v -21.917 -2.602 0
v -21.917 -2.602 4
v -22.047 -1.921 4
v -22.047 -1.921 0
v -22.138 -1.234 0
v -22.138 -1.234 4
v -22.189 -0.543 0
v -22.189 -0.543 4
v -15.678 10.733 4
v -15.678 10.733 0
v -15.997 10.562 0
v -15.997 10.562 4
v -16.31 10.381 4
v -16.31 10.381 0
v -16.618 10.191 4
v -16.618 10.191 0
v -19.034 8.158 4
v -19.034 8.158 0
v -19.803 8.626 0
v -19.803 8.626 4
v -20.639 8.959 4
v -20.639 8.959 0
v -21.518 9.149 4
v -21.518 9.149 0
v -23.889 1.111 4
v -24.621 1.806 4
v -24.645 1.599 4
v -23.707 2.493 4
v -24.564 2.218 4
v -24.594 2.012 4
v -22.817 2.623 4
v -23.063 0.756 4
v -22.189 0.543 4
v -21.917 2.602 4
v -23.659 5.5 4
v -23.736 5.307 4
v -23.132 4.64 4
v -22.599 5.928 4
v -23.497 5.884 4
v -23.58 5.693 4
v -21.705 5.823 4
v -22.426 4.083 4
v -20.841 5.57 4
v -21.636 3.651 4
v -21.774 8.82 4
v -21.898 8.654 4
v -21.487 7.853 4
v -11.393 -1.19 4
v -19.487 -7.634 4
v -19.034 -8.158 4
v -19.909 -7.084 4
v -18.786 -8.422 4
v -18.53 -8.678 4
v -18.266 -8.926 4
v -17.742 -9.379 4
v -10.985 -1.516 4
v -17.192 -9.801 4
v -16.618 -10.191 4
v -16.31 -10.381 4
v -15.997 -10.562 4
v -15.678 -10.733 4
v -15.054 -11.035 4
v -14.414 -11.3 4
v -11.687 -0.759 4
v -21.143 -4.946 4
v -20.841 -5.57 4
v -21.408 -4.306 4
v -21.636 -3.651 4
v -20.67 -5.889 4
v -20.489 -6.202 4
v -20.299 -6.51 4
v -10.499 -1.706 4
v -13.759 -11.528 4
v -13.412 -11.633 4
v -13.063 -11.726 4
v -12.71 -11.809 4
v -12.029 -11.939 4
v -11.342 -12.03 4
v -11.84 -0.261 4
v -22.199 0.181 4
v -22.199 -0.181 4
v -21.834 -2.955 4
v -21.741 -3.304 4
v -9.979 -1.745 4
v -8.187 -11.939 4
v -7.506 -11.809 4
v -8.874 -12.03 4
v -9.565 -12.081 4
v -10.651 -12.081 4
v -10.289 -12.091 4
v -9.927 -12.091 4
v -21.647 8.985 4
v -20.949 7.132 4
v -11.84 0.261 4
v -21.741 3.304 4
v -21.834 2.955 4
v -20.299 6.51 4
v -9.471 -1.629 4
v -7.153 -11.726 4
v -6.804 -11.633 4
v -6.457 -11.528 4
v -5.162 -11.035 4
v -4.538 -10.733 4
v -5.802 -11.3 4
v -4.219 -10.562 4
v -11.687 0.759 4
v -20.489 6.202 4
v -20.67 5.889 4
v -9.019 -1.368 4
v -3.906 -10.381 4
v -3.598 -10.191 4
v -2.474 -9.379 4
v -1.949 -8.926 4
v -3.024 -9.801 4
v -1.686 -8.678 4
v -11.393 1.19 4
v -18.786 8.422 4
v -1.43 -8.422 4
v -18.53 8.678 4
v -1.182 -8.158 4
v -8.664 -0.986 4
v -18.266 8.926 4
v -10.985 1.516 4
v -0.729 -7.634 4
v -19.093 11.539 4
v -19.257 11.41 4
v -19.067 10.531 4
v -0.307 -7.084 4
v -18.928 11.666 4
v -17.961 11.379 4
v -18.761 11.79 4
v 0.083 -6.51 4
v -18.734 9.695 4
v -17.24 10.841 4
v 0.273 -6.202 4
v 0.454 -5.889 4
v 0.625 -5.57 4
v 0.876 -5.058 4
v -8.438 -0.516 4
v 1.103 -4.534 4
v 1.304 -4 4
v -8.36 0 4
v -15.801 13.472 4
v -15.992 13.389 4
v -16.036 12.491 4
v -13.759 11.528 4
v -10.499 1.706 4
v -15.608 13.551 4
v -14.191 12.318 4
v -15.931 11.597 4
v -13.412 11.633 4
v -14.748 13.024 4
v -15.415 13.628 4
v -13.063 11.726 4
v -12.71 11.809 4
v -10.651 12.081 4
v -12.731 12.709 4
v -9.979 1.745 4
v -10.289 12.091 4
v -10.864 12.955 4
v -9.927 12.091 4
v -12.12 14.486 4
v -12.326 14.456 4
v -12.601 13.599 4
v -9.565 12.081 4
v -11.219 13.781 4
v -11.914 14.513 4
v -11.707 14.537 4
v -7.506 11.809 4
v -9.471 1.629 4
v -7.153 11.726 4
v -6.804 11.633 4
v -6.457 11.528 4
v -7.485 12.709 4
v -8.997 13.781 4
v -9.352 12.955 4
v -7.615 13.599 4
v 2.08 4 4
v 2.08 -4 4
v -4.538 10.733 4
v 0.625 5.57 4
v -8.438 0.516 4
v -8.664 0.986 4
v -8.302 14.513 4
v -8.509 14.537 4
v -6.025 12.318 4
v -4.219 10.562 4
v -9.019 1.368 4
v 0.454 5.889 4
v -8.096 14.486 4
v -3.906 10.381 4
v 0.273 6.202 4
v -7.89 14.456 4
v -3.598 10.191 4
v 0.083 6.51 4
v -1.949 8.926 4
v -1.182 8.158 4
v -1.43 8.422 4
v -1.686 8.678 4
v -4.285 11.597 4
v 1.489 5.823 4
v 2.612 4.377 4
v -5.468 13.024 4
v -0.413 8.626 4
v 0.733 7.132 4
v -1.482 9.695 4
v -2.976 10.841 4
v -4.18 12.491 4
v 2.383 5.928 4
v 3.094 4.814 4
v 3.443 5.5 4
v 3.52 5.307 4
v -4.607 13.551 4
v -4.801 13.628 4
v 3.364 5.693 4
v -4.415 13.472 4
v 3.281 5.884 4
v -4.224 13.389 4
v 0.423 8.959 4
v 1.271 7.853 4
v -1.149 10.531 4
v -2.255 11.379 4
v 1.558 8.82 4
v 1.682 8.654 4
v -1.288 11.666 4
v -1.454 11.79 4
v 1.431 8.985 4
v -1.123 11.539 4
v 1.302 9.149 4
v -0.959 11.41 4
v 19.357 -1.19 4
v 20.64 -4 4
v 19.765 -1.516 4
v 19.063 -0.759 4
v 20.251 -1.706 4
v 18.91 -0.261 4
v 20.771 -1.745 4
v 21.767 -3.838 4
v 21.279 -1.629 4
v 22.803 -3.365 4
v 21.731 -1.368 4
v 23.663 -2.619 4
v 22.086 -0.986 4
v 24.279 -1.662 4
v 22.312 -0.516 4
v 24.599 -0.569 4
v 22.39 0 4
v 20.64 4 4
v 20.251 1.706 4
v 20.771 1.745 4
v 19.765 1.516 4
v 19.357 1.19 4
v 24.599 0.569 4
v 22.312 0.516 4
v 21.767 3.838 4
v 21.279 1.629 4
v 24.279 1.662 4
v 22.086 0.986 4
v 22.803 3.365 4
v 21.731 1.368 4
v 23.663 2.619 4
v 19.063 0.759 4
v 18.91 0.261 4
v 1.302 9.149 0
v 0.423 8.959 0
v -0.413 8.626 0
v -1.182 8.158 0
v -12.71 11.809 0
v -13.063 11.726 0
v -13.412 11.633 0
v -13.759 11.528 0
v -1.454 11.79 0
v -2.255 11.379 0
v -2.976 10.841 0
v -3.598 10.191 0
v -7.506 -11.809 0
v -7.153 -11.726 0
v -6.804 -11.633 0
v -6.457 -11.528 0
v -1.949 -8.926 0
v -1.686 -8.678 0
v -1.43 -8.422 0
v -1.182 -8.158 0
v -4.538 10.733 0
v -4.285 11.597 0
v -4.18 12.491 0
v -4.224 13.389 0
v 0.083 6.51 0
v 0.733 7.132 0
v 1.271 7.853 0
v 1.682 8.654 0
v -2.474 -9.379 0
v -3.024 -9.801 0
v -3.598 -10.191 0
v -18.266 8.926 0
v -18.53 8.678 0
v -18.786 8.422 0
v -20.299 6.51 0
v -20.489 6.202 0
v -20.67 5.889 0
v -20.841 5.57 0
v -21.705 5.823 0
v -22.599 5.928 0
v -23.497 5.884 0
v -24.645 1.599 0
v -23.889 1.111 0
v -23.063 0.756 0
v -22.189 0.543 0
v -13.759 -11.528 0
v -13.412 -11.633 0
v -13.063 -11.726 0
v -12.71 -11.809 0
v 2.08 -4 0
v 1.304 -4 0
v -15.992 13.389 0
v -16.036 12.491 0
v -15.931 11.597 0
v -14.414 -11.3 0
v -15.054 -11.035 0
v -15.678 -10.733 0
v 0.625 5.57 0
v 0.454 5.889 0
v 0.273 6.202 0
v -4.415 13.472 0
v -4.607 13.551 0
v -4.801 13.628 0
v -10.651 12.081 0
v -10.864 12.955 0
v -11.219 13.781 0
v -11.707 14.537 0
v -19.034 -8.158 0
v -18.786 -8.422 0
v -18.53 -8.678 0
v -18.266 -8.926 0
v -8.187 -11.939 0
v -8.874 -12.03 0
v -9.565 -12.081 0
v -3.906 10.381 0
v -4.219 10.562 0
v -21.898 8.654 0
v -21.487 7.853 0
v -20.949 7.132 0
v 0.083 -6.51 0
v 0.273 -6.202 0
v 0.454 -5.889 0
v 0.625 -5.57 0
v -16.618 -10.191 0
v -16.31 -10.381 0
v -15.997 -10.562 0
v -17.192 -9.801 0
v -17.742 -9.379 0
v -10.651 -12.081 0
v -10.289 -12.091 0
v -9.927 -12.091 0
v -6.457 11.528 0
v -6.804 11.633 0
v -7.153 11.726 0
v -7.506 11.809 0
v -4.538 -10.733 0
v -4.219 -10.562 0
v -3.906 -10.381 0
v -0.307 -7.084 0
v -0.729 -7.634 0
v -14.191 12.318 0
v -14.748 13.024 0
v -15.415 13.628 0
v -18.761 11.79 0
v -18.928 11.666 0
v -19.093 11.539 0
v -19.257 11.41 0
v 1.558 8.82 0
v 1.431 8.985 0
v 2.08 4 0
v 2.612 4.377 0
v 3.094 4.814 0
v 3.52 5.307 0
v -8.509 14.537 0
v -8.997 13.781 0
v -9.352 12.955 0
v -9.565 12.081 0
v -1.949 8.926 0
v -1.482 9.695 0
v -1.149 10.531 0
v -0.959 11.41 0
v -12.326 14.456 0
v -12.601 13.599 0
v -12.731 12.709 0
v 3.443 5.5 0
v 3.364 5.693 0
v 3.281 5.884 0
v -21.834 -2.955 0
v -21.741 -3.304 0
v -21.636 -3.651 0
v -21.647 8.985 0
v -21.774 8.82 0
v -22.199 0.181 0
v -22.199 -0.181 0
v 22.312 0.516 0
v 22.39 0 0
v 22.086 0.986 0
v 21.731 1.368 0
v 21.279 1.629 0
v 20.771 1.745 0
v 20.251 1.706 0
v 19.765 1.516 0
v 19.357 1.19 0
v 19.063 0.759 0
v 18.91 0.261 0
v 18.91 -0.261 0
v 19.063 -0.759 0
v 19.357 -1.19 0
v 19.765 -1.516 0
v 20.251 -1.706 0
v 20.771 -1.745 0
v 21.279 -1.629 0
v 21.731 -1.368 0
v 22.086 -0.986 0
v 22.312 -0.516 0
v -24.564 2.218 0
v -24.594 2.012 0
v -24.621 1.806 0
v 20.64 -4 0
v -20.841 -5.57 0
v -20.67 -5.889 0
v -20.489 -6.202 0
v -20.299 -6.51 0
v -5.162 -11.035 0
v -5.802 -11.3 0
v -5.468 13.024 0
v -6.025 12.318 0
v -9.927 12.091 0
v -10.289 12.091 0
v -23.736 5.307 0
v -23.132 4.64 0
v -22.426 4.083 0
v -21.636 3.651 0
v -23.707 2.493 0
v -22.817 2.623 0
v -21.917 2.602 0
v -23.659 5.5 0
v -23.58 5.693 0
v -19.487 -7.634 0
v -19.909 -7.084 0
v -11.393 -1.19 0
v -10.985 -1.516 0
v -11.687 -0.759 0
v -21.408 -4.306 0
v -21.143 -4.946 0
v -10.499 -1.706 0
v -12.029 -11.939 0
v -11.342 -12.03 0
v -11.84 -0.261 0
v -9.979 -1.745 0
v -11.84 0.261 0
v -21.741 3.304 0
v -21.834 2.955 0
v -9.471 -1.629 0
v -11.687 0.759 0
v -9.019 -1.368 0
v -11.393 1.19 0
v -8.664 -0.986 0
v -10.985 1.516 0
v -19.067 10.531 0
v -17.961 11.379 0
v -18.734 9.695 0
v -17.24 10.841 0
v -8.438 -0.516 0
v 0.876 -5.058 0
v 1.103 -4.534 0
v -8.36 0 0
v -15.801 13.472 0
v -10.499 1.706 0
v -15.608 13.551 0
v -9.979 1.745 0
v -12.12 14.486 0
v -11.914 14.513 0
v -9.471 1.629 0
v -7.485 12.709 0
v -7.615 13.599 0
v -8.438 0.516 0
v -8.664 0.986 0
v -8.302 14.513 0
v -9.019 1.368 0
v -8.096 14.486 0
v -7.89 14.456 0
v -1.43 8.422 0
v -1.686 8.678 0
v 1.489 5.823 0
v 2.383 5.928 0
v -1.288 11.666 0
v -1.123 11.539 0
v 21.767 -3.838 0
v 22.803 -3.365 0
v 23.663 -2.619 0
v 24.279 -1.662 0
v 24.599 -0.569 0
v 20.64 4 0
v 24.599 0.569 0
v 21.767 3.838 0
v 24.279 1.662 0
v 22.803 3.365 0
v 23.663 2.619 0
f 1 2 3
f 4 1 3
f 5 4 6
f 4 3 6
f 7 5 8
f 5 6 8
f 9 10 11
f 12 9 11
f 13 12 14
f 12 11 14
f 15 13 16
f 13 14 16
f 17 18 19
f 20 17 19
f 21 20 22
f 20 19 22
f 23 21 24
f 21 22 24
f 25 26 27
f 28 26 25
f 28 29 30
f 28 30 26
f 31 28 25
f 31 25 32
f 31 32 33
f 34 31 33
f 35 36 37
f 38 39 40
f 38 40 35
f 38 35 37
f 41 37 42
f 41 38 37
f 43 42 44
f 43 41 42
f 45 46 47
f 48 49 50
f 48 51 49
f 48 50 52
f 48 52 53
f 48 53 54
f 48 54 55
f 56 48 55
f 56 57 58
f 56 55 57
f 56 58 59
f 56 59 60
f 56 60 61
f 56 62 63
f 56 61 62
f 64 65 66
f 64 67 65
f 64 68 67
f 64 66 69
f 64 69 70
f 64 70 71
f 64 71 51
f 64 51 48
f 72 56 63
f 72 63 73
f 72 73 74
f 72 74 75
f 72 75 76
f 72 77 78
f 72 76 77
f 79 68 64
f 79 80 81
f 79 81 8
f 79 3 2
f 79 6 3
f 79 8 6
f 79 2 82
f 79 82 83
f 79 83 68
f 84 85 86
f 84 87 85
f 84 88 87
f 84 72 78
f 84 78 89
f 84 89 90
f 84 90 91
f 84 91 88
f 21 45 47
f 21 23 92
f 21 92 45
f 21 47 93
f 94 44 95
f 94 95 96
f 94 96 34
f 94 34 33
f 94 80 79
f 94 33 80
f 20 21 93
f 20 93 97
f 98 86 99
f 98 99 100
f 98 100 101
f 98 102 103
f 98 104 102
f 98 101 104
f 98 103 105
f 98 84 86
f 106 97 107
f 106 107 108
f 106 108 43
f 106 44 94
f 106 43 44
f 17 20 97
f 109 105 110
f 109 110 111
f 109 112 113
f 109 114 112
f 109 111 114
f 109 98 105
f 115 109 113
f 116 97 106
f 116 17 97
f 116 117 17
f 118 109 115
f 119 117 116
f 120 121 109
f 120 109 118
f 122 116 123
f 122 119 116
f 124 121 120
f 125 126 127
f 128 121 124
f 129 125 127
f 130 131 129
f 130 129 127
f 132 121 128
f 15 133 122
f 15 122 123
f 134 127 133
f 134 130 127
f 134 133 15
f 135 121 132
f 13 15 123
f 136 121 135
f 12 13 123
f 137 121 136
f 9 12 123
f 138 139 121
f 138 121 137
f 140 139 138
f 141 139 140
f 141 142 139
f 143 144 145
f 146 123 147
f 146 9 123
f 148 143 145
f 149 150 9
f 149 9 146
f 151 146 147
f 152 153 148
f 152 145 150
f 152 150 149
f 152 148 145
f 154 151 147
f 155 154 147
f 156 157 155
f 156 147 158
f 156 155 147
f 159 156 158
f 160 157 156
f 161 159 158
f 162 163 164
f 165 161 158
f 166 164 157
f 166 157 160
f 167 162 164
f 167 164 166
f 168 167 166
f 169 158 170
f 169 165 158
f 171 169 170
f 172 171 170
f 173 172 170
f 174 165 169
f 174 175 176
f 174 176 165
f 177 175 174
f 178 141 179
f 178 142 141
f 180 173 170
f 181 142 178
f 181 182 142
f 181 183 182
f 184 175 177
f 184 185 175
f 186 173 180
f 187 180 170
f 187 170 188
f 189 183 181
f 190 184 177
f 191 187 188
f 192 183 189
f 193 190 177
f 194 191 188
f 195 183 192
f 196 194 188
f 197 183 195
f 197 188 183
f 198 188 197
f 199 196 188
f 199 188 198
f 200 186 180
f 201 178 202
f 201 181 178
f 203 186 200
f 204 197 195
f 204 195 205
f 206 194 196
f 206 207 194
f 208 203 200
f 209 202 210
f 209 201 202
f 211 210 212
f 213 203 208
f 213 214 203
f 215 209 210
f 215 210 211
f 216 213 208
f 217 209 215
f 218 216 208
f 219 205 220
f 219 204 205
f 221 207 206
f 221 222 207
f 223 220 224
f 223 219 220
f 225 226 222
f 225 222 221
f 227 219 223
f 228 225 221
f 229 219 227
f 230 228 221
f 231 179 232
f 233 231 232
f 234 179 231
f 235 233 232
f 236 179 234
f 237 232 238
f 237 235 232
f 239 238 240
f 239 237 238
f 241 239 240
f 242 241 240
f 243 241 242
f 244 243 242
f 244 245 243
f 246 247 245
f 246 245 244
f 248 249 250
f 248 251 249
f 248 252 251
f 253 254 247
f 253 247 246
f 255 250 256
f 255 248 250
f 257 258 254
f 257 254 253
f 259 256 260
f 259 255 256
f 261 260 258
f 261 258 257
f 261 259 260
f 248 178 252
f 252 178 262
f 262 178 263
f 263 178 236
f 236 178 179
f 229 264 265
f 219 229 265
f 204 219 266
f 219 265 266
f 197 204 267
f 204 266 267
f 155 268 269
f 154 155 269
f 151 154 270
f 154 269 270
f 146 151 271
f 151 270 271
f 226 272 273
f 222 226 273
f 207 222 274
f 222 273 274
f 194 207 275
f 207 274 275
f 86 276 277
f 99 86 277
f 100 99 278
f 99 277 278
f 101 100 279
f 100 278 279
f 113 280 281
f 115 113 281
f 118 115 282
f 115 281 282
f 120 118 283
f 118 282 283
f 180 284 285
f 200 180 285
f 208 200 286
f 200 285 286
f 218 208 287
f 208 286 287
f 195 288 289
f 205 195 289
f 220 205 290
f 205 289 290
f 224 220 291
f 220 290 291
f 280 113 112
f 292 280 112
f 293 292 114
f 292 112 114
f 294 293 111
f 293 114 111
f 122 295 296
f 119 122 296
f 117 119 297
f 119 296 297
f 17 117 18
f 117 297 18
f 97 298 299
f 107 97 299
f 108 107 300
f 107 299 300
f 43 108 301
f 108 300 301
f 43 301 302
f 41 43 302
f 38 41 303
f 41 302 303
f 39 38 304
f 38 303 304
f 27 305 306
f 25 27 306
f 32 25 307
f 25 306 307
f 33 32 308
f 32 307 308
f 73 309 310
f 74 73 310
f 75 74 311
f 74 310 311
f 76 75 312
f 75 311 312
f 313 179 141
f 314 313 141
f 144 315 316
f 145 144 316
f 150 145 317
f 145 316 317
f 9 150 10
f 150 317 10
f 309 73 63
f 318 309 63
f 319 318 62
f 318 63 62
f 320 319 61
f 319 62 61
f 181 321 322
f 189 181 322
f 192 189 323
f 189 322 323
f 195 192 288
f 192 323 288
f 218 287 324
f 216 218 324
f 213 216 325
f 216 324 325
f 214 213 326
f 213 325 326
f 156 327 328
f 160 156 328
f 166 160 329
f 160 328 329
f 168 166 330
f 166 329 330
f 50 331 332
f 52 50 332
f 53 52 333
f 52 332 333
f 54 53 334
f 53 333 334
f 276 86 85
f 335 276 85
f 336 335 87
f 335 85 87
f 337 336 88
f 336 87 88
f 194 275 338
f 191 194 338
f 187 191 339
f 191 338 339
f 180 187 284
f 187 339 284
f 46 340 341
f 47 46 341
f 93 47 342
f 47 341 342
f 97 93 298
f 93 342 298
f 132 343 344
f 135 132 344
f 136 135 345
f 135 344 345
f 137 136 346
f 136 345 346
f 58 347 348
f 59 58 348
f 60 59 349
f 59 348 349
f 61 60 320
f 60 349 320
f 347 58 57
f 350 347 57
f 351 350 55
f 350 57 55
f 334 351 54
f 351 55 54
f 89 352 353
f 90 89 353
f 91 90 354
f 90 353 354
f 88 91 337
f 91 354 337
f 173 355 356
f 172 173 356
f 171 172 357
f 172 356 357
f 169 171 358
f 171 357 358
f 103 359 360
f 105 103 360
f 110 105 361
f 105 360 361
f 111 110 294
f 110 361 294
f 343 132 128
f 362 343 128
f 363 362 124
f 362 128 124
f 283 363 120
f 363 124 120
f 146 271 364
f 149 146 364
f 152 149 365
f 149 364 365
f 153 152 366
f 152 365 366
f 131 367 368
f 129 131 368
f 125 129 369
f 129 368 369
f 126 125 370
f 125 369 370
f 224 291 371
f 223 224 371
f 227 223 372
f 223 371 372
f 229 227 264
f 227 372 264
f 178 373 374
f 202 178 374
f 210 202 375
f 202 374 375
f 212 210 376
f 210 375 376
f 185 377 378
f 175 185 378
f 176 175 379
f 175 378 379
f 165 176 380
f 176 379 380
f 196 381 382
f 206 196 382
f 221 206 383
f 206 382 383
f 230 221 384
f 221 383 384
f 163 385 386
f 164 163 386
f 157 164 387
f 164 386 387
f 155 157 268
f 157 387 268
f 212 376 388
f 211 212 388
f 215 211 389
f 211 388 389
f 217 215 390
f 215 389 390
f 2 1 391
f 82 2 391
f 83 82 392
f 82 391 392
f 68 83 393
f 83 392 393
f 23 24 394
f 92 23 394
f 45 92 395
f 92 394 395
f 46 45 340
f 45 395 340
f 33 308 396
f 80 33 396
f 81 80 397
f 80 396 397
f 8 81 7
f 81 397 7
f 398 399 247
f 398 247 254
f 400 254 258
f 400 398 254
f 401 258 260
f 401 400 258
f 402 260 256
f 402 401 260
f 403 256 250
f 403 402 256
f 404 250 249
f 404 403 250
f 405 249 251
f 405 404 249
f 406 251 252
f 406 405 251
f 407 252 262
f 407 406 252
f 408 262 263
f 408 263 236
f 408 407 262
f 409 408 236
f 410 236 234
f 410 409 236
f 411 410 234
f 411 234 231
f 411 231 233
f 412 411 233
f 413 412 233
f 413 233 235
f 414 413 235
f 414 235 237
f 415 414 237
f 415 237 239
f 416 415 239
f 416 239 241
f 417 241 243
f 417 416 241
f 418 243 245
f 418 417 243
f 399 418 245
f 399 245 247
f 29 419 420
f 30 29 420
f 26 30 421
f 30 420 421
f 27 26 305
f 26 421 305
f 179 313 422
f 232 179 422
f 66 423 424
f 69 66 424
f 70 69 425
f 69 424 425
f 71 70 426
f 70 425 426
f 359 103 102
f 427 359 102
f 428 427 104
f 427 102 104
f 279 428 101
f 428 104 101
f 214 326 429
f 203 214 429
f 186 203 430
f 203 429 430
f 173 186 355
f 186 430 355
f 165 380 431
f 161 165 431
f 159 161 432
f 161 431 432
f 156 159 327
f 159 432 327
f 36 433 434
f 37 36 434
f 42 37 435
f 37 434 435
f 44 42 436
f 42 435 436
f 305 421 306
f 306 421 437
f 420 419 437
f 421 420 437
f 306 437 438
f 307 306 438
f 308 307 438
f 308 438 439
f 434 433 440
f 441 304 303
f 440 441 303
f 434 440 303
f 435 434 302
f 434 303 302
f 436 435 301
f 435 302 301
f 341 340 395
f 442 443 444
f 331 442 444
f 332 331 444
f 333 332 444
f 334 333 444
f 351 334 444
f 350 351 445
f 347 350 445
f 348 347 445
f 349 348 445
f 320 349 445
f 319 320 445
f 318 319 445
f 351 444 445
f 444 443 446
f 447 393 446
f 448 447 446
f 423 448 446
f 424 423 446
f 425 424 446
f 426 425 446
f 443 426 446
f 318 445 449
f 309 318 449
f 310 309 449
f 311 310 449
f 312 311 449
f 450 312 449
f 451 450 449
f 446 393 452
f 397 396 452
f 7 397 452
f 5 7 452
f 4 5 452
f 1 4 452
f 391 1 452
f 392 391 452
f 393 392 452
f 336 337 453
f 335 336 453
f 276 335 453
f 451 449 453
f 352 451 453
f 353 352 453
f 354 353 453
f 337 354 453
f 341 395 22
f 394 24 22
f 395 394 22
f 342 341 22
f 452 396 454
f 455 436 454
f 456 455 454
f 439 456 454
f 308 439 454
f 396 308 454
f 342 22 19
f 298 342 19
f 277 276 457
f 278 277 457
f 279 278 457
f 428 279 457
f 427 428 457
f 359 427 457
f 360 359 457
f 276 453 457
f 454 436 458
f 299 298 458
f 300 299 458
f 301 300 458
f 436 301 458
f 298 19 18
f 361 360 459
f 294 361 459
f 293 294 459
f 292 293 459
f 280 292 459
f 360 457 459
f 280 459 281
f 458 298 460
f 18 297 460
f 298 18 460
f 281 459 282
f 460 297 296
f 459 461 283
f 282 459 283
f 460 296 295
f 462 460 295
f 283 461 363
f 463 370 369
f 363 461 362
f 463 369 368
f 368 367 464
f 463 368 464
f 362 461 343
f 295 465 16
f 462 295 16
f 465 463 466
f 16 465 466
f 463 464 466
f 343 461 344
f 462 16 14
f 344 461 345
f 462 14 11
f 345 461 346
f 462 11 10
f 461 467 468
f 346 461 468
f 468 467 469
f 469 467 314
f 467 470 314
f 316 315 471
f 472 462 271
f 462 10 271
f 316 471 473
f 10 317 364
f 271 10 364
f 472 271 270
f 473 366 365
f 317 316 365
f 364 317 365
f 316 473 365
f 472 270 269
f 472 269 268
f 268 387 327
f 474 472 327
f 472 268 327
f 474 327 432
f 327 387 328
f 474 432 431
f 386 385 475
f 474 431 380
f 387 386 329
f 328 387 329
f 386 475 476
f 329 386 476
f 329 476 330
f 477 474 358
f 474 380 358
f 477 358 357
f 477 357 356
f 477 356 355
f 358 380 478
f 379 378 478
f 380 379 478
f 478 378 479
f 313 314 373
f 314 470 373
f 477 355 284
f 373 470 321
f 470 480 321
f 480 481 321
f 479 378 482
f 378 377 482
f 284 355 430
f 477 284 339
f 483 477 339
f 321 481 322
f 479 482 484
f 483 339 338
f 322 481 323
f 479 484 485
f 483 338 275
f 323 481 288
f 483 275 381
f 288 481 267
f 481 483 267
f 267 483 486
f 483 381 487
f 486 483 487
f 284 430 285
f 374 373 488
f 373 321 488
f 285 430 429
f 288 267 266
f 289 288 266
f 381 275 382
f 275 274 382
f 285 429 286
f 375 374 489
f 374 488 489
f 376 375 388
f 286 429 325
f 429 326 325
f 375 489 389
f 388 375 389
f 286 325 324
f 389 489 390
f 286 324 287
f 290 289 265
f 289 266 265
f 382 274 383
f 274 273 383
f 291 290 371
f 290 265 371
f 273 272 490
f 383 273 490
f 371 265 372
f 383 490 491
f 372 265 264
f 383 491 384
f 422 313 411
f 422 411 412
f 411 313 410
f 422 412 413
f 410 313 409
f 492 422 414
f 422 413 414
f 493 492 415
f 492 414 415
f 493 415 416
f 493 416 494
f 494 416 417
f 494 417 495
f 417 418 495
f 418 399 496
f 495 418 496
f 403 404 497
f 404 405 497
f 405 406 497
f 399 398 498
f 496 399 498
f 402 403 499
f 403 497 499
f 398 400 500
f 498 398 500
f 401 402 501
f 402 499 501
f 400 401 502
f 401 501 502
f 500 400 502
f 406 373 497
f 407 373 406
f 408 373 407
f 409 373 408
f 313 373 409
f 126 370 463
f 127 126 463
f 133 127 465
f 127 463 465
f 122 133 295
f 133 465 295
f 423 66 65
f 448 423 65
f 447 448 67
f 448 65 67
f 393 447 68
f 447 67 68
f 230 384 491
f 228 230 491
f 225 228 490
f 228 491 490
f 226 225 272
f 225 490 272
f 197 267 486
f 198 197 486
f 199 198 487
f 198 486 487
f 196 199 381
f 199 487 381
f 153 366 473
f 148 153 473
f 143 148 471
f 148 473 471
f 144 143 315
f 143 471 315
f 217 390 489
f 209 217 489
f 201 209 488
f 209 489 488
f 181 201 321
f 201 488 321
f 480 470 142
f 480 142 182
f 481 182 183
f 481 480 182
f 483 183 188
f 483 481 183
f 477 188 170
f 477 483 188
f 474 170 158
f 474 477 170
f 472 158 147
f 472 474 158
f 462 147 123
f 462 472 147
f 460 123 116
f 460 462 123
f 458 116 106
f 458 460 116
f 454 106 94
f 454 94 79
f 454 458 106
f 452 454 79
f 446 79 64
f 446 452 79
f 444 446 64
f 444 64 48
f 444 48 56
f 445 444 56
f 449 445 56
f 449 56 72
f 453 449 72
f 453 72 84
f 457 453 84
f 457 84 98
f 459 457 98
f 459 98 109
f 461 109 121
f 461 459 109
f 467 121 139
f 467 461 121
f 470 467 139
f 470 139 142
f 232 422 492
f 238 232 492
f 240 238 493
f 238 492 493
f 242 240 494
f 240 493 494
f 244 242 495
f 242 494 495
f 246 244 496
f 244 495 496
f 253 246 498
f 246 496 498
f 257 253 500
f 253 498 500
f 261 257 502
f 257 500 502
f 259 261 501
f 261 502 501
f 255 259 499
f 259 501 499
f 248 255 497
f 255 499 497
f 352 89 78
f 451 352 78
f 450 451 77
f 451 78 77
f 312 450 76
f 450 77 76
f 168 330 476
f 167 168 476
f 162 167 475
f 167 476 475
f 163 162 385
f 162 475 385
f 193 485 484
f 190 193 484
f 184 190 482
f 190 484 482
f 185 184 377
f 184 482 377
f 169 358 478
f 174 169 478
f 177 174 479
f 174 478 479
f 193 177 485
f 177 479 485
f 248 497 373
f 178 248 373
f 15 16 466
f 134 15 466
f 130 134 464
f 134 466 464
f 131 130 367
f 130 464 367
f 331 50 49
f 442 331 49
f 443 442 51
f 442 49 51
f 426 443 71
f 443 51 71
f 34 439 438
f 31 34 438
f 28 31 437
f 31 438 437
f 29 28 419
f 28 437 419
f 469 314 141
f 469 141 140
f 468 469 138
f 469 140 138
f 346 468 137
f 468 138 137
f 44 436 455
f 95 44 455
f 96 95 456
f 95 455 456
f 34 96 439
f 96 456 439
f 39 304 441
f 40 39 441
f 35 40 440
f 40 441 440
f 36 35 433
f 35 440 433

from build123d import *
from build123d.topology import SkipClean

# Parameters (mm, degrees)
SKETCH1_R           = 1.75
BOSS_EXTRUDE1_DEPTH = 4
CUT_EXTRUDE1_DEPTH  = 29.891595766


with BuildPart() as part:
    # Sketch1 → Boss-Extrude1 (new body)
    with BuildSketch(Plane.XY):
        with BuildLine():
            Line((20.64, 4), (2.08, 4))
            ThreePointArc((2.08, 4), (2.859386397, 4.588201733), (3.5201075, 5.30713988))
            ThreePointArc((3.5201075, 5.30713988), (3.403753673, 5.596745198), (3.281246369, 5.883801663))
            ThreePointArc((3.281246369, 5.883801663), (1.933634043, 5.894040025), (0.625453025, 5.57027124))
            ThreePointArc((0.625453025, 5.57027124), (0.364644212, 6.046375), (0.082730667, 6.510293938))
            ThreePointArc((0.082730667, 6.510293938), (1.017213169, 7.48132754), (1.68215265, 8.65351323))
            ThreePointArc((1.68215265, 8.65351323), (1.494808112, 8.903135899), (1.302179463, 9.148703928))
            ThreePointArc((1.302179463, 9.148703928), (-0.002163969, 8.809805691), (-1.181972273, 8.158486898))
            ThreePointArc((-1.181972273, 8.158486898), (-1.557118962, 8.550865528), (-1.949497592, 8.926012217))
            ThreePointArc((-1.949497592, 8.926012217), (-1.298178799, 10.105820521), (-0.959280562, 11.410163953))
            ThreePointArc((-0.959280562, 11.410163953), (-1.204848591, 11.602792602), (-1.45447126, 11.79013714))
            ThreePointArc((-1.45447126, 11.79013714), (-2.62665695, 11.125197659), (-3.597690552, 10.190715157))
            ThreePointArc((-3.597690552, 10.190715157), (-4.06160949, 10.472628702), (-4.53771325, 10.733437515))
            ThreePointArc((-4.53771325, 10.733437515), (-4.213944465, 12.041618533), (-4.224182827, 13.389230859))
            ThreePointArc((-4.224182827, 13.389230859), (-4.511239292, 13.511738163), (-4.80084461, 13.62809199))
            ThreePointArc((-4.80084461, 13.62809199), (-5.760990039, 12.682425791), (-6.457074605, 11.528463019))
            ThreePointArc((-6.457074605, 11.528463019), (-6.978150482, 11.680699536), (-7.505533688, 11.809396783))
            ThreePointArc((-7.505533688, 11.809396783), (-7.531379219, 13.156800143), (-7.890056453, 14.455843809))
            ThreePointArc((-7.890056453, 14.455843809), (-8.199038929, 14.499881098), (-8.508890771, 14.537314892))
            ThreePointArc((-8.508890771, 14.537314892), (-9.191563616, 13.375367565), (-9.565262132, 12.080565177))
            ThreePointArc((-9.565262132, 12.080565177), (-10.10798449, 12.09275), (-10.650706848, 12.080565177))
            ThreePointArc((-10.650706848, 12.080565177), (-11.024405364, 13.375367565), (-11.707078209, 14.537314892))
            ThreePointArc((-11.707078209, 14.537314892), (-12.016930051, 14.499881098), (-12.325912527, 14.455843809))
            ThreePointArc((-12.325912527, 14.455843809), (-12.684589761, 13.156800143), (-12.710435292, 11.809396783))
            ThreePointArc((-12.710435292, 11.809396783), (-13.237818498, 11.680699536), (-13.758894375, 11.528463019))
            ThreePointArc((-13.758894375, 11.528463019), (-14.454978941, 12.682425791), (-15.41512437, 13.62809199))
            ThreePointArc((-15.41512437, 13.62809199), (-15.704729688, 13.511738163), (-15.991786153, 13.389230859))
            ThreePointArc((-15.991786153, 13.389230859), (-16.002024515, 12.041618533), (-15.67825573, 10.733437515))
            ThreePointArc((-15.67825573, 10.733437515), (-16.15435949, 10.472628702), (-16.618278428, 10.190715157))
            ThreePointArc((-16.618278428, 10.190715157), (-17.58931203, 11.125197659), (-18.76149772, 11.79013714))
            ThreePointArc((-18.76149772, 11.79013714), (-19.011120389, 11.602792602), (-19.256688418, 11.410163953))
            ThreePointArc((-19.256688418, 11.410163953), (-18.917790181, 10.105820521), (-18.266471388, 8.926012217))
            ThreePointArc((-18.266471388, 8.926012217), (-18.658850018, 8.550865528), (-19.033996707, 8.158486898))
            ThreePointArc((-19.033996707, 8.158486898), (-20.213805011, 8.809805691), (-21.518148443, 9.148703928))
            ThreePointArc((-21.518148443, 9.148703928), (-21.710777092, 8.903135899), (-21.89812163, 8.65351323))
            ThreePointArc((-21.89812163, 8.65351323), (-21.233182149, 7.48132754), (-20.298699647, 6.510293938))
            ThreePointArc((-20.298699647, 6.510293938), (-20.580613192, 6.046375), (-20.841422005, 5.57027124))
            ThreePointArc((-20.841422005, 5.57027124), (-22.149603023, 5.894040025), (-23.497215349, 5.883801663))
            ThreePointArc((-23.497215349, 5.883801663), (-23.619722653, 5.596745198), (-23.73607648, 5.30713988))
            ThreePointArc((-23.73607648, 5.30713988), (-22.790410282, 4.346994451), (-21.636447509, 3.650909885))
            ThreePointArc((-21.636447509, 3.650909885), (-21.788684026, 3.129834008), (-21.917381273, 2.602450802))
            ThreePointArc((-21.917381273, 2.602450802), (-23.264784633, 2.576605271), (-24.563828299, 2.217928037))
            ThreePointArc((-24.563828299, 2.217928037), (-24.607865588, 1.908945561), (-24.645299382, 1.599093719))
            ThreePointArc((-24.645299382, 1.599093719), (-23.483352055, 0.916420874), (-22.188549667, 0.542722358))
            ThreePointArc((-22.188549667, 0.542722358), (-22.20073449, 0), (-22.188549667, -0.542722358))
            ThreePointArc((-22.188549667, -0.542722358), (-23.483352055, -0.916420874), (-24.645299382, -1.599093719))
            ThreePointArc((-24.645299382, -1.599093719), (-24.607865588, -1.908945561), (-24.563828299, -2.217928037))
            ThreePointArc((-24.563828299, -2.217928037), (-23.264784633, -2.576605271), (-21.917381273, -2.602450802))
            ThreePointArc((-21.917381273, -2.602450802), (-21.788684026, -3.129834008), (-21.636447509, -3.650909885))
            ThreePointArc((-21.636447509, -3.650909885), (-22.790410282, -4.346994451), (-23.73607648, -5.30713988))
            ThreePointArc((-23.73607648, -5.30713988), (-23.619722653, -5.596745198), (-23.497215349, -5.883801663))
            ThreePointArc((-23.497215349, -5.883801663), (-22.149603023, -5.894040025), (-20.841422005, -5.57027124))
            ThreePointArc((-20.841422005, -5.57027124), (-20.580613192, -6.046375), (-20.298699647, -6.510293938))
            ThreePointArc((-20.298699647, -6.510293938), (-21.233182149, -7.48132754), (-21.89812163, -8.65351323))
            ThreePointArc((-21.89812163, -8.65351323), (-21.710777092, -8.903135899), (-21.518148443, -9.148703928))
            ThreePointArc((-21.518148443, -9.148703928), (-20.213805011, -8.809805691), (-19.033996707, -8.158486898))
            ThreePointArc((-19.033996707, -8.158486898), (-18.658850018, -8.550865528), (-18.266471388, -8.926012217))
            ThreePointArc((-18.266471388, -8.926012217), (-18.917790181, -10.105820521), (-19.256688418, -11.410163953))
            ThreePointArc((-19.256688418, -11.410163953), (-19.011120389, -11.602792602), (-18.76149772, -11.79013714))
            ThreePointArc((-18.76149772, -11.79013714), (-17.58931203, -11.125197659), (-16.618278428, -10.190715157))
            ThreePointArc((-16.618278428, -10.190715157), (-16.15435949, -10.472628702), (-15.67825573, -10.733437515))
            ThreePointArc((-15.67825573, -10.733437515), (-16.002024515, -12.041618533), (-15.991786153, -13.389230859))
            ThreePointArc((-15.991786153, -13.389230859), (-15.704729688, -13.511738163), (-15.41512437, -13.62809199))
            ThreePointArc((-15.41512437, -13.62809199), (-14.454978941, -12.682425791), (-13.758894375, -11.528463019))
            ThreePointArc((-13.758894375, -11.528463019), (-13.237818498, -11.680699536), (-12.710435292, -11.809396783))
            ThreePointArc((-12.710435292, -11.809396783), (-12.684589761, -13.156800143), (-12.325912527, -14.455843809))
            ThreePointArc((-12.325912527, -14.455843809), (-12.016930051, -14.499881098), (-11.707078209, -14.537314892))
            ThreePointArc((-11.707078209, -14.537314892), (-11.024405364, -13.375367565), (-10.650706848, -12.080565177))
            ThreePointArc((-10.650706848, -12.080565177), (-10.10798449, -12.09275), (-9.565262132, -12.080565177))
            ThreePointArc((-9.565262132, -12.080565177), (-9.191563616, -13.375367565), (-8.508890771, -14.537314892))
            ThreePointArc((-8.508890771, -14.537314892), (-8.199038929, -14.499881098), (-7.890056453, -14.455843809))
            ThreePointArc((-7.890056453, -14.455843809), (-7.531379219, -13.156800143), (-7.505533688, -11.809396783))
            ThreePointArc((-7.505533688, -11.809396783), (-6.978150482, -11.680699536), (-6.457074605, -11.528463019))
            ThreePointArc((-6.457074605, -11.528463019), (-5.760990039, -12.682425791), (-4.80084461, -13.62809199))
            ThreePointArc((-4.80084461, -13.62809199), (-4.511239292, -13.511738163), (-4.224182827, -13.389230859))
            ThreePointArc((-4.224182827, -13.389230859), (-4.213944465, -12.041618533), (-4.53771325, -10.733437515))
            ThreePointArc((-4.53771325, -10.733437515), (-4.06160949, -10.472628702), (-3.597690552, -10.190715157))
            ThreePointArc((-3.597690552, -10.190715157), (-2.62665695, -11.125197659), (-1.45447126, -11.79013714))
            ThreePointArc((-1.45447126, -11.79013714), (-1.204848591, -11.602792602), (-0.959280562, -11.410163953))
            ThreePointArc((-0.959280562, -11.410163953), (-1.298178799, -10.105820521), (-1.949497592, -8.926012217))
            ThreePointArc((-1.949497592, -8.926012217), (-1.557118962, -8.550865528), (-1.181972273, -8.158486898))
            ThreePointArc((-1.181972273, -8.158486898), (-0.002163969, -8.809805691), (1.302179463, -9.148703928))
            ThreePointArc((1.302179463, -9.148703928), (1.494808112, -8.903135899), (1.68215265, -8.65351323))
            ThreePointArc((1.68215265, -8.65351323), (1.017213169, -7.48132754), (0.082730667, -6.510293938))
            ThreePointArc((0.082730667, -6.510293938), (0.364644212, -6.046375), (0.625453025, -5.57027124))
            ThreePointArc((0.625453025, -5.57027124), (1.933634043, -5.894040025), (3.281246369, -5.883801663))
            ThreePointArc((3.281246369, -5.883801663), (3.403753673, -5.596745198), (3.5201075, -5.30713988))
            ThreePointArc((3.5201075, -5.30713988), (2.859386397, -4.588201733), (2.08, -4))
            Line((2.08, -4), (20.64, -4))
            ThreePointArc((20.64, -4), (24.64, 0), (20.64, 4))
        make_face()
        with Locations((-10.11, 0)):
            Circle(SKETCH1_R, mode=Mode.SUBTRACT)
        with Locations((20.64, 0)):
            Circle(SKETCH1_R, mode=Mode.SUBTRACT)
    extrude(amount=BOSS_EXTRUDE1_DEPTH)

    # Sketch2 → Cut-Extrude1 (cut, through all)
    with SkipClean():  # the faces are left unmerged after this step: merging them gives an invalid solid
        with BuildSketch(Plane.XY.offset(4)):
            with BuildLine():
                ThreePointArc((3.5201075, -5.30713988), (2.859386397, -4.588201733), (2.08, -4))
                Line((2.08, -4), (1.304053127, -4))
                ThreePointArc((1.304053127, -4), (0.992554017, -4.797149927), (0.625453025, -5.57027124))
                ThreePointArc((0.625453025, -5.57027124), (1.933634043, -5.894040025), (3.281246369, -5.883801663))
                ThreePointArc((3.281246369, -5.883801663), (3.403753673, -5.596745198), (3.5201075, -5.30713988))
            make_face()
            with BuildLine():
                ThreePointArc((1.68215265, -8.65351323), (1.017213169, -7.48132754), (0.082730667, -6.510293938))
                ThreePointArc((0.082730667, -6.510293938), (-0.514160884, -7.361599771), (-1.181972273, -8.158486898))
                ThreePointArc((-1.181972273, -8.158486898), (-0.002163969, -8.809805691), (1.302179463, -9.148703928))
                ThreePointArc((1.302179463, -9.148703928), (1.494808112, -8.903135899), (1.68215265, -8.65351323))
            make_face()
            with BuildLine():
                ThreePointArc((-0.959280562, -11.410163953), (-1.298178799, -10.105820521), (-1.949497592, -8.926012217))
                ThreePointArc((-1.949497592, -8.926012217), (-2.746384719, -9.593823606), (-3.597690552, -10.190715157))
                ThreePointArc((-3.597690552, -10.190715157), (-2.62665695, -11.125197659), (-1.45447126, -11.79013714))
                ThreePointArc((-1.45447126, -11.79013714), (-1.204848591, -11.602792602), (-0.959280562, -11.410163953))
            make_face()
            with BuildLine():
                ThreePointArc((-4.224182827, -13.389230859), (-4.213944465, -12.041618533), (-4.53771325, -10.733437515))
                ThreePointArc((-4.53771325, -10.733437515), (-5.480289413, -11.172244217), (-6.457074605, -11.528463019))
                ThreePointArc((-6.457074605, -11.528463019), (-5.760990039, -12.682425791), (-4.80084461, -13.62809199))
                ThreePointArc((-4.80084461, -13.62809199), (-4.511239292, -13.511738163), (-4.224182827, -13.389230859))
            make_face()
            with BuildLine():
                ThreePointArc((-7.890056453, -14.455843809), (-7.531379219, -13.156800143), (-7.505533688, -11.809396783))
                ThreePointArc((-7.505533688, -11.809396783), (-8.529563879, -11.989294847), (-9.565262132, -12.080565177))
                ThreePointArc((-9.565262132, -12.080565177), (-9.191563616, -13.375367565), (-8.508890771, -14.537314892))
                ThreePointArc((-8.508890771, -14.537314892), (-8.199038929, -14.499881098), (-7.890056453, -14.455843809))
            make_face()
            with BuildLine():
                ThreePointArc((-11.707078209, -14.537314892), (-11.024405364, -13.375367565), (-10.650706848, -12.080565177))
                ThreePointArc((-10.650706848, -12.080565177), (-11.686405101, -11.989294847), (-12.710435292, -11.809396783))
                ThreePointArc((-12.710435292, -11.809396783), (-12.684589761, -13.156800143), (-12.325912527, -14.455843809))
                ThreePointArc((-12.325912527, -14.455843809), (-12.016930051, -14.499881098), (-11.707078209, -14.537314892))
            make_face()
            with BuildLine():
                ThreePointArc((-15.41512437, -13.62809199), (-14.454978941, -12.682425791), (-13.758894375, -11.528463019))
                ThreePointArc((-13.758894375, -11.528463019), (-14.735679567, -11.172244217), (-15.67825573, -10.733437515))
                ThreePointArc((-15.67825573, -10.733437515), (-16.002024515, -12.041618533), (-15.991786153, -13.389230859))
                ThreePointArc((-15.991786153, -13.389230859), (-15.704729688, -13.511738163), (-15.41512437, -13.62809199))
            make_face()
            with BuildLine():
                ThreePointArc((-18.76149772, -11.79013714), (-17.58931203, -11.125197659), (-16.618278428, -10.190715157))
                ThreePointArc((-16.618278428, -10.190715157), (-17.469584261, -9.593823606), (-18.266471388, -8.926012217))
                ThreePointArc((-18.266471388, -8.926012217), (-18.917790181, -10.105820521), (-19.256688418, -11.410163953))
                ThreePointArc((-19.256688418, -11.410163953), (-19.011120389, -11.602792602), (-18.76149772, -11.79013714))
            make_face()
            with BuildLine():
                ThreePointArc((-21.518148443, -9.148703928), (-20.213805011, -8.809805691), (-19.033996707, -8.158486898))
                ThreePointArc((-19.033996707, -8.158486898), (-19.701808096, -7.361599771), (-20.298699647, -6.510293938))
                ThreePointArc((-20.298699647, -6.510293938), (-21.233182149, -7.48132754), (-21.89812163, -8.65351323))
                ThreePointArc((-21.89812163, -8.65351323), (-21.710777092, -8.903135899), (-21.518148443, -9.148703928))
            make_face()
            with BuildLine():
                ThreePointArc((-23.497215349, -5.883801663), (-22.149603023, -5.894040025), (-20.841422005, -5.57027124))
                ThreePointArc((-20.841422005, -5.57027124), (-21.280228707, -4.627695077), (-21.636447509, -3.650909885))
                ThreePointArc((-21.636447509, -3.650909885), (-22.790410282, -4.346994451), (-23.73607648, -5.30713988))
                ThreePointArc((-23.73607648, -5.30713988), (-23.619722653, -5.596745198), (-23.497215349, -5.883801663))
            make_face()
            with BuildLine():
                ThreePointArc((-24.563828299, -2.217928037), (-23.264784633, -2.576605271), (-21.917381273, -2.602450802))
                ThreePointArc((-21.917381273, -2.602450802), (-22.097279337, -1.578420611), (-22.188549667, -0.542722358))
                ThreePointArc((-22.188549667, -0.542722358), (-23.483352055, -0.916420874), (-24.645299382, -1.599093719))
                ThreePointArc((-24.645299382, -1.599093719), (-24.607865588, -1.908945561), (-24.563828299, -2.217928037))
            make_face()
        extrude(amount=-CUT_EXTRUDE1_DEPTH, mode=Mode.SUBTRACT)


solid = part.part
